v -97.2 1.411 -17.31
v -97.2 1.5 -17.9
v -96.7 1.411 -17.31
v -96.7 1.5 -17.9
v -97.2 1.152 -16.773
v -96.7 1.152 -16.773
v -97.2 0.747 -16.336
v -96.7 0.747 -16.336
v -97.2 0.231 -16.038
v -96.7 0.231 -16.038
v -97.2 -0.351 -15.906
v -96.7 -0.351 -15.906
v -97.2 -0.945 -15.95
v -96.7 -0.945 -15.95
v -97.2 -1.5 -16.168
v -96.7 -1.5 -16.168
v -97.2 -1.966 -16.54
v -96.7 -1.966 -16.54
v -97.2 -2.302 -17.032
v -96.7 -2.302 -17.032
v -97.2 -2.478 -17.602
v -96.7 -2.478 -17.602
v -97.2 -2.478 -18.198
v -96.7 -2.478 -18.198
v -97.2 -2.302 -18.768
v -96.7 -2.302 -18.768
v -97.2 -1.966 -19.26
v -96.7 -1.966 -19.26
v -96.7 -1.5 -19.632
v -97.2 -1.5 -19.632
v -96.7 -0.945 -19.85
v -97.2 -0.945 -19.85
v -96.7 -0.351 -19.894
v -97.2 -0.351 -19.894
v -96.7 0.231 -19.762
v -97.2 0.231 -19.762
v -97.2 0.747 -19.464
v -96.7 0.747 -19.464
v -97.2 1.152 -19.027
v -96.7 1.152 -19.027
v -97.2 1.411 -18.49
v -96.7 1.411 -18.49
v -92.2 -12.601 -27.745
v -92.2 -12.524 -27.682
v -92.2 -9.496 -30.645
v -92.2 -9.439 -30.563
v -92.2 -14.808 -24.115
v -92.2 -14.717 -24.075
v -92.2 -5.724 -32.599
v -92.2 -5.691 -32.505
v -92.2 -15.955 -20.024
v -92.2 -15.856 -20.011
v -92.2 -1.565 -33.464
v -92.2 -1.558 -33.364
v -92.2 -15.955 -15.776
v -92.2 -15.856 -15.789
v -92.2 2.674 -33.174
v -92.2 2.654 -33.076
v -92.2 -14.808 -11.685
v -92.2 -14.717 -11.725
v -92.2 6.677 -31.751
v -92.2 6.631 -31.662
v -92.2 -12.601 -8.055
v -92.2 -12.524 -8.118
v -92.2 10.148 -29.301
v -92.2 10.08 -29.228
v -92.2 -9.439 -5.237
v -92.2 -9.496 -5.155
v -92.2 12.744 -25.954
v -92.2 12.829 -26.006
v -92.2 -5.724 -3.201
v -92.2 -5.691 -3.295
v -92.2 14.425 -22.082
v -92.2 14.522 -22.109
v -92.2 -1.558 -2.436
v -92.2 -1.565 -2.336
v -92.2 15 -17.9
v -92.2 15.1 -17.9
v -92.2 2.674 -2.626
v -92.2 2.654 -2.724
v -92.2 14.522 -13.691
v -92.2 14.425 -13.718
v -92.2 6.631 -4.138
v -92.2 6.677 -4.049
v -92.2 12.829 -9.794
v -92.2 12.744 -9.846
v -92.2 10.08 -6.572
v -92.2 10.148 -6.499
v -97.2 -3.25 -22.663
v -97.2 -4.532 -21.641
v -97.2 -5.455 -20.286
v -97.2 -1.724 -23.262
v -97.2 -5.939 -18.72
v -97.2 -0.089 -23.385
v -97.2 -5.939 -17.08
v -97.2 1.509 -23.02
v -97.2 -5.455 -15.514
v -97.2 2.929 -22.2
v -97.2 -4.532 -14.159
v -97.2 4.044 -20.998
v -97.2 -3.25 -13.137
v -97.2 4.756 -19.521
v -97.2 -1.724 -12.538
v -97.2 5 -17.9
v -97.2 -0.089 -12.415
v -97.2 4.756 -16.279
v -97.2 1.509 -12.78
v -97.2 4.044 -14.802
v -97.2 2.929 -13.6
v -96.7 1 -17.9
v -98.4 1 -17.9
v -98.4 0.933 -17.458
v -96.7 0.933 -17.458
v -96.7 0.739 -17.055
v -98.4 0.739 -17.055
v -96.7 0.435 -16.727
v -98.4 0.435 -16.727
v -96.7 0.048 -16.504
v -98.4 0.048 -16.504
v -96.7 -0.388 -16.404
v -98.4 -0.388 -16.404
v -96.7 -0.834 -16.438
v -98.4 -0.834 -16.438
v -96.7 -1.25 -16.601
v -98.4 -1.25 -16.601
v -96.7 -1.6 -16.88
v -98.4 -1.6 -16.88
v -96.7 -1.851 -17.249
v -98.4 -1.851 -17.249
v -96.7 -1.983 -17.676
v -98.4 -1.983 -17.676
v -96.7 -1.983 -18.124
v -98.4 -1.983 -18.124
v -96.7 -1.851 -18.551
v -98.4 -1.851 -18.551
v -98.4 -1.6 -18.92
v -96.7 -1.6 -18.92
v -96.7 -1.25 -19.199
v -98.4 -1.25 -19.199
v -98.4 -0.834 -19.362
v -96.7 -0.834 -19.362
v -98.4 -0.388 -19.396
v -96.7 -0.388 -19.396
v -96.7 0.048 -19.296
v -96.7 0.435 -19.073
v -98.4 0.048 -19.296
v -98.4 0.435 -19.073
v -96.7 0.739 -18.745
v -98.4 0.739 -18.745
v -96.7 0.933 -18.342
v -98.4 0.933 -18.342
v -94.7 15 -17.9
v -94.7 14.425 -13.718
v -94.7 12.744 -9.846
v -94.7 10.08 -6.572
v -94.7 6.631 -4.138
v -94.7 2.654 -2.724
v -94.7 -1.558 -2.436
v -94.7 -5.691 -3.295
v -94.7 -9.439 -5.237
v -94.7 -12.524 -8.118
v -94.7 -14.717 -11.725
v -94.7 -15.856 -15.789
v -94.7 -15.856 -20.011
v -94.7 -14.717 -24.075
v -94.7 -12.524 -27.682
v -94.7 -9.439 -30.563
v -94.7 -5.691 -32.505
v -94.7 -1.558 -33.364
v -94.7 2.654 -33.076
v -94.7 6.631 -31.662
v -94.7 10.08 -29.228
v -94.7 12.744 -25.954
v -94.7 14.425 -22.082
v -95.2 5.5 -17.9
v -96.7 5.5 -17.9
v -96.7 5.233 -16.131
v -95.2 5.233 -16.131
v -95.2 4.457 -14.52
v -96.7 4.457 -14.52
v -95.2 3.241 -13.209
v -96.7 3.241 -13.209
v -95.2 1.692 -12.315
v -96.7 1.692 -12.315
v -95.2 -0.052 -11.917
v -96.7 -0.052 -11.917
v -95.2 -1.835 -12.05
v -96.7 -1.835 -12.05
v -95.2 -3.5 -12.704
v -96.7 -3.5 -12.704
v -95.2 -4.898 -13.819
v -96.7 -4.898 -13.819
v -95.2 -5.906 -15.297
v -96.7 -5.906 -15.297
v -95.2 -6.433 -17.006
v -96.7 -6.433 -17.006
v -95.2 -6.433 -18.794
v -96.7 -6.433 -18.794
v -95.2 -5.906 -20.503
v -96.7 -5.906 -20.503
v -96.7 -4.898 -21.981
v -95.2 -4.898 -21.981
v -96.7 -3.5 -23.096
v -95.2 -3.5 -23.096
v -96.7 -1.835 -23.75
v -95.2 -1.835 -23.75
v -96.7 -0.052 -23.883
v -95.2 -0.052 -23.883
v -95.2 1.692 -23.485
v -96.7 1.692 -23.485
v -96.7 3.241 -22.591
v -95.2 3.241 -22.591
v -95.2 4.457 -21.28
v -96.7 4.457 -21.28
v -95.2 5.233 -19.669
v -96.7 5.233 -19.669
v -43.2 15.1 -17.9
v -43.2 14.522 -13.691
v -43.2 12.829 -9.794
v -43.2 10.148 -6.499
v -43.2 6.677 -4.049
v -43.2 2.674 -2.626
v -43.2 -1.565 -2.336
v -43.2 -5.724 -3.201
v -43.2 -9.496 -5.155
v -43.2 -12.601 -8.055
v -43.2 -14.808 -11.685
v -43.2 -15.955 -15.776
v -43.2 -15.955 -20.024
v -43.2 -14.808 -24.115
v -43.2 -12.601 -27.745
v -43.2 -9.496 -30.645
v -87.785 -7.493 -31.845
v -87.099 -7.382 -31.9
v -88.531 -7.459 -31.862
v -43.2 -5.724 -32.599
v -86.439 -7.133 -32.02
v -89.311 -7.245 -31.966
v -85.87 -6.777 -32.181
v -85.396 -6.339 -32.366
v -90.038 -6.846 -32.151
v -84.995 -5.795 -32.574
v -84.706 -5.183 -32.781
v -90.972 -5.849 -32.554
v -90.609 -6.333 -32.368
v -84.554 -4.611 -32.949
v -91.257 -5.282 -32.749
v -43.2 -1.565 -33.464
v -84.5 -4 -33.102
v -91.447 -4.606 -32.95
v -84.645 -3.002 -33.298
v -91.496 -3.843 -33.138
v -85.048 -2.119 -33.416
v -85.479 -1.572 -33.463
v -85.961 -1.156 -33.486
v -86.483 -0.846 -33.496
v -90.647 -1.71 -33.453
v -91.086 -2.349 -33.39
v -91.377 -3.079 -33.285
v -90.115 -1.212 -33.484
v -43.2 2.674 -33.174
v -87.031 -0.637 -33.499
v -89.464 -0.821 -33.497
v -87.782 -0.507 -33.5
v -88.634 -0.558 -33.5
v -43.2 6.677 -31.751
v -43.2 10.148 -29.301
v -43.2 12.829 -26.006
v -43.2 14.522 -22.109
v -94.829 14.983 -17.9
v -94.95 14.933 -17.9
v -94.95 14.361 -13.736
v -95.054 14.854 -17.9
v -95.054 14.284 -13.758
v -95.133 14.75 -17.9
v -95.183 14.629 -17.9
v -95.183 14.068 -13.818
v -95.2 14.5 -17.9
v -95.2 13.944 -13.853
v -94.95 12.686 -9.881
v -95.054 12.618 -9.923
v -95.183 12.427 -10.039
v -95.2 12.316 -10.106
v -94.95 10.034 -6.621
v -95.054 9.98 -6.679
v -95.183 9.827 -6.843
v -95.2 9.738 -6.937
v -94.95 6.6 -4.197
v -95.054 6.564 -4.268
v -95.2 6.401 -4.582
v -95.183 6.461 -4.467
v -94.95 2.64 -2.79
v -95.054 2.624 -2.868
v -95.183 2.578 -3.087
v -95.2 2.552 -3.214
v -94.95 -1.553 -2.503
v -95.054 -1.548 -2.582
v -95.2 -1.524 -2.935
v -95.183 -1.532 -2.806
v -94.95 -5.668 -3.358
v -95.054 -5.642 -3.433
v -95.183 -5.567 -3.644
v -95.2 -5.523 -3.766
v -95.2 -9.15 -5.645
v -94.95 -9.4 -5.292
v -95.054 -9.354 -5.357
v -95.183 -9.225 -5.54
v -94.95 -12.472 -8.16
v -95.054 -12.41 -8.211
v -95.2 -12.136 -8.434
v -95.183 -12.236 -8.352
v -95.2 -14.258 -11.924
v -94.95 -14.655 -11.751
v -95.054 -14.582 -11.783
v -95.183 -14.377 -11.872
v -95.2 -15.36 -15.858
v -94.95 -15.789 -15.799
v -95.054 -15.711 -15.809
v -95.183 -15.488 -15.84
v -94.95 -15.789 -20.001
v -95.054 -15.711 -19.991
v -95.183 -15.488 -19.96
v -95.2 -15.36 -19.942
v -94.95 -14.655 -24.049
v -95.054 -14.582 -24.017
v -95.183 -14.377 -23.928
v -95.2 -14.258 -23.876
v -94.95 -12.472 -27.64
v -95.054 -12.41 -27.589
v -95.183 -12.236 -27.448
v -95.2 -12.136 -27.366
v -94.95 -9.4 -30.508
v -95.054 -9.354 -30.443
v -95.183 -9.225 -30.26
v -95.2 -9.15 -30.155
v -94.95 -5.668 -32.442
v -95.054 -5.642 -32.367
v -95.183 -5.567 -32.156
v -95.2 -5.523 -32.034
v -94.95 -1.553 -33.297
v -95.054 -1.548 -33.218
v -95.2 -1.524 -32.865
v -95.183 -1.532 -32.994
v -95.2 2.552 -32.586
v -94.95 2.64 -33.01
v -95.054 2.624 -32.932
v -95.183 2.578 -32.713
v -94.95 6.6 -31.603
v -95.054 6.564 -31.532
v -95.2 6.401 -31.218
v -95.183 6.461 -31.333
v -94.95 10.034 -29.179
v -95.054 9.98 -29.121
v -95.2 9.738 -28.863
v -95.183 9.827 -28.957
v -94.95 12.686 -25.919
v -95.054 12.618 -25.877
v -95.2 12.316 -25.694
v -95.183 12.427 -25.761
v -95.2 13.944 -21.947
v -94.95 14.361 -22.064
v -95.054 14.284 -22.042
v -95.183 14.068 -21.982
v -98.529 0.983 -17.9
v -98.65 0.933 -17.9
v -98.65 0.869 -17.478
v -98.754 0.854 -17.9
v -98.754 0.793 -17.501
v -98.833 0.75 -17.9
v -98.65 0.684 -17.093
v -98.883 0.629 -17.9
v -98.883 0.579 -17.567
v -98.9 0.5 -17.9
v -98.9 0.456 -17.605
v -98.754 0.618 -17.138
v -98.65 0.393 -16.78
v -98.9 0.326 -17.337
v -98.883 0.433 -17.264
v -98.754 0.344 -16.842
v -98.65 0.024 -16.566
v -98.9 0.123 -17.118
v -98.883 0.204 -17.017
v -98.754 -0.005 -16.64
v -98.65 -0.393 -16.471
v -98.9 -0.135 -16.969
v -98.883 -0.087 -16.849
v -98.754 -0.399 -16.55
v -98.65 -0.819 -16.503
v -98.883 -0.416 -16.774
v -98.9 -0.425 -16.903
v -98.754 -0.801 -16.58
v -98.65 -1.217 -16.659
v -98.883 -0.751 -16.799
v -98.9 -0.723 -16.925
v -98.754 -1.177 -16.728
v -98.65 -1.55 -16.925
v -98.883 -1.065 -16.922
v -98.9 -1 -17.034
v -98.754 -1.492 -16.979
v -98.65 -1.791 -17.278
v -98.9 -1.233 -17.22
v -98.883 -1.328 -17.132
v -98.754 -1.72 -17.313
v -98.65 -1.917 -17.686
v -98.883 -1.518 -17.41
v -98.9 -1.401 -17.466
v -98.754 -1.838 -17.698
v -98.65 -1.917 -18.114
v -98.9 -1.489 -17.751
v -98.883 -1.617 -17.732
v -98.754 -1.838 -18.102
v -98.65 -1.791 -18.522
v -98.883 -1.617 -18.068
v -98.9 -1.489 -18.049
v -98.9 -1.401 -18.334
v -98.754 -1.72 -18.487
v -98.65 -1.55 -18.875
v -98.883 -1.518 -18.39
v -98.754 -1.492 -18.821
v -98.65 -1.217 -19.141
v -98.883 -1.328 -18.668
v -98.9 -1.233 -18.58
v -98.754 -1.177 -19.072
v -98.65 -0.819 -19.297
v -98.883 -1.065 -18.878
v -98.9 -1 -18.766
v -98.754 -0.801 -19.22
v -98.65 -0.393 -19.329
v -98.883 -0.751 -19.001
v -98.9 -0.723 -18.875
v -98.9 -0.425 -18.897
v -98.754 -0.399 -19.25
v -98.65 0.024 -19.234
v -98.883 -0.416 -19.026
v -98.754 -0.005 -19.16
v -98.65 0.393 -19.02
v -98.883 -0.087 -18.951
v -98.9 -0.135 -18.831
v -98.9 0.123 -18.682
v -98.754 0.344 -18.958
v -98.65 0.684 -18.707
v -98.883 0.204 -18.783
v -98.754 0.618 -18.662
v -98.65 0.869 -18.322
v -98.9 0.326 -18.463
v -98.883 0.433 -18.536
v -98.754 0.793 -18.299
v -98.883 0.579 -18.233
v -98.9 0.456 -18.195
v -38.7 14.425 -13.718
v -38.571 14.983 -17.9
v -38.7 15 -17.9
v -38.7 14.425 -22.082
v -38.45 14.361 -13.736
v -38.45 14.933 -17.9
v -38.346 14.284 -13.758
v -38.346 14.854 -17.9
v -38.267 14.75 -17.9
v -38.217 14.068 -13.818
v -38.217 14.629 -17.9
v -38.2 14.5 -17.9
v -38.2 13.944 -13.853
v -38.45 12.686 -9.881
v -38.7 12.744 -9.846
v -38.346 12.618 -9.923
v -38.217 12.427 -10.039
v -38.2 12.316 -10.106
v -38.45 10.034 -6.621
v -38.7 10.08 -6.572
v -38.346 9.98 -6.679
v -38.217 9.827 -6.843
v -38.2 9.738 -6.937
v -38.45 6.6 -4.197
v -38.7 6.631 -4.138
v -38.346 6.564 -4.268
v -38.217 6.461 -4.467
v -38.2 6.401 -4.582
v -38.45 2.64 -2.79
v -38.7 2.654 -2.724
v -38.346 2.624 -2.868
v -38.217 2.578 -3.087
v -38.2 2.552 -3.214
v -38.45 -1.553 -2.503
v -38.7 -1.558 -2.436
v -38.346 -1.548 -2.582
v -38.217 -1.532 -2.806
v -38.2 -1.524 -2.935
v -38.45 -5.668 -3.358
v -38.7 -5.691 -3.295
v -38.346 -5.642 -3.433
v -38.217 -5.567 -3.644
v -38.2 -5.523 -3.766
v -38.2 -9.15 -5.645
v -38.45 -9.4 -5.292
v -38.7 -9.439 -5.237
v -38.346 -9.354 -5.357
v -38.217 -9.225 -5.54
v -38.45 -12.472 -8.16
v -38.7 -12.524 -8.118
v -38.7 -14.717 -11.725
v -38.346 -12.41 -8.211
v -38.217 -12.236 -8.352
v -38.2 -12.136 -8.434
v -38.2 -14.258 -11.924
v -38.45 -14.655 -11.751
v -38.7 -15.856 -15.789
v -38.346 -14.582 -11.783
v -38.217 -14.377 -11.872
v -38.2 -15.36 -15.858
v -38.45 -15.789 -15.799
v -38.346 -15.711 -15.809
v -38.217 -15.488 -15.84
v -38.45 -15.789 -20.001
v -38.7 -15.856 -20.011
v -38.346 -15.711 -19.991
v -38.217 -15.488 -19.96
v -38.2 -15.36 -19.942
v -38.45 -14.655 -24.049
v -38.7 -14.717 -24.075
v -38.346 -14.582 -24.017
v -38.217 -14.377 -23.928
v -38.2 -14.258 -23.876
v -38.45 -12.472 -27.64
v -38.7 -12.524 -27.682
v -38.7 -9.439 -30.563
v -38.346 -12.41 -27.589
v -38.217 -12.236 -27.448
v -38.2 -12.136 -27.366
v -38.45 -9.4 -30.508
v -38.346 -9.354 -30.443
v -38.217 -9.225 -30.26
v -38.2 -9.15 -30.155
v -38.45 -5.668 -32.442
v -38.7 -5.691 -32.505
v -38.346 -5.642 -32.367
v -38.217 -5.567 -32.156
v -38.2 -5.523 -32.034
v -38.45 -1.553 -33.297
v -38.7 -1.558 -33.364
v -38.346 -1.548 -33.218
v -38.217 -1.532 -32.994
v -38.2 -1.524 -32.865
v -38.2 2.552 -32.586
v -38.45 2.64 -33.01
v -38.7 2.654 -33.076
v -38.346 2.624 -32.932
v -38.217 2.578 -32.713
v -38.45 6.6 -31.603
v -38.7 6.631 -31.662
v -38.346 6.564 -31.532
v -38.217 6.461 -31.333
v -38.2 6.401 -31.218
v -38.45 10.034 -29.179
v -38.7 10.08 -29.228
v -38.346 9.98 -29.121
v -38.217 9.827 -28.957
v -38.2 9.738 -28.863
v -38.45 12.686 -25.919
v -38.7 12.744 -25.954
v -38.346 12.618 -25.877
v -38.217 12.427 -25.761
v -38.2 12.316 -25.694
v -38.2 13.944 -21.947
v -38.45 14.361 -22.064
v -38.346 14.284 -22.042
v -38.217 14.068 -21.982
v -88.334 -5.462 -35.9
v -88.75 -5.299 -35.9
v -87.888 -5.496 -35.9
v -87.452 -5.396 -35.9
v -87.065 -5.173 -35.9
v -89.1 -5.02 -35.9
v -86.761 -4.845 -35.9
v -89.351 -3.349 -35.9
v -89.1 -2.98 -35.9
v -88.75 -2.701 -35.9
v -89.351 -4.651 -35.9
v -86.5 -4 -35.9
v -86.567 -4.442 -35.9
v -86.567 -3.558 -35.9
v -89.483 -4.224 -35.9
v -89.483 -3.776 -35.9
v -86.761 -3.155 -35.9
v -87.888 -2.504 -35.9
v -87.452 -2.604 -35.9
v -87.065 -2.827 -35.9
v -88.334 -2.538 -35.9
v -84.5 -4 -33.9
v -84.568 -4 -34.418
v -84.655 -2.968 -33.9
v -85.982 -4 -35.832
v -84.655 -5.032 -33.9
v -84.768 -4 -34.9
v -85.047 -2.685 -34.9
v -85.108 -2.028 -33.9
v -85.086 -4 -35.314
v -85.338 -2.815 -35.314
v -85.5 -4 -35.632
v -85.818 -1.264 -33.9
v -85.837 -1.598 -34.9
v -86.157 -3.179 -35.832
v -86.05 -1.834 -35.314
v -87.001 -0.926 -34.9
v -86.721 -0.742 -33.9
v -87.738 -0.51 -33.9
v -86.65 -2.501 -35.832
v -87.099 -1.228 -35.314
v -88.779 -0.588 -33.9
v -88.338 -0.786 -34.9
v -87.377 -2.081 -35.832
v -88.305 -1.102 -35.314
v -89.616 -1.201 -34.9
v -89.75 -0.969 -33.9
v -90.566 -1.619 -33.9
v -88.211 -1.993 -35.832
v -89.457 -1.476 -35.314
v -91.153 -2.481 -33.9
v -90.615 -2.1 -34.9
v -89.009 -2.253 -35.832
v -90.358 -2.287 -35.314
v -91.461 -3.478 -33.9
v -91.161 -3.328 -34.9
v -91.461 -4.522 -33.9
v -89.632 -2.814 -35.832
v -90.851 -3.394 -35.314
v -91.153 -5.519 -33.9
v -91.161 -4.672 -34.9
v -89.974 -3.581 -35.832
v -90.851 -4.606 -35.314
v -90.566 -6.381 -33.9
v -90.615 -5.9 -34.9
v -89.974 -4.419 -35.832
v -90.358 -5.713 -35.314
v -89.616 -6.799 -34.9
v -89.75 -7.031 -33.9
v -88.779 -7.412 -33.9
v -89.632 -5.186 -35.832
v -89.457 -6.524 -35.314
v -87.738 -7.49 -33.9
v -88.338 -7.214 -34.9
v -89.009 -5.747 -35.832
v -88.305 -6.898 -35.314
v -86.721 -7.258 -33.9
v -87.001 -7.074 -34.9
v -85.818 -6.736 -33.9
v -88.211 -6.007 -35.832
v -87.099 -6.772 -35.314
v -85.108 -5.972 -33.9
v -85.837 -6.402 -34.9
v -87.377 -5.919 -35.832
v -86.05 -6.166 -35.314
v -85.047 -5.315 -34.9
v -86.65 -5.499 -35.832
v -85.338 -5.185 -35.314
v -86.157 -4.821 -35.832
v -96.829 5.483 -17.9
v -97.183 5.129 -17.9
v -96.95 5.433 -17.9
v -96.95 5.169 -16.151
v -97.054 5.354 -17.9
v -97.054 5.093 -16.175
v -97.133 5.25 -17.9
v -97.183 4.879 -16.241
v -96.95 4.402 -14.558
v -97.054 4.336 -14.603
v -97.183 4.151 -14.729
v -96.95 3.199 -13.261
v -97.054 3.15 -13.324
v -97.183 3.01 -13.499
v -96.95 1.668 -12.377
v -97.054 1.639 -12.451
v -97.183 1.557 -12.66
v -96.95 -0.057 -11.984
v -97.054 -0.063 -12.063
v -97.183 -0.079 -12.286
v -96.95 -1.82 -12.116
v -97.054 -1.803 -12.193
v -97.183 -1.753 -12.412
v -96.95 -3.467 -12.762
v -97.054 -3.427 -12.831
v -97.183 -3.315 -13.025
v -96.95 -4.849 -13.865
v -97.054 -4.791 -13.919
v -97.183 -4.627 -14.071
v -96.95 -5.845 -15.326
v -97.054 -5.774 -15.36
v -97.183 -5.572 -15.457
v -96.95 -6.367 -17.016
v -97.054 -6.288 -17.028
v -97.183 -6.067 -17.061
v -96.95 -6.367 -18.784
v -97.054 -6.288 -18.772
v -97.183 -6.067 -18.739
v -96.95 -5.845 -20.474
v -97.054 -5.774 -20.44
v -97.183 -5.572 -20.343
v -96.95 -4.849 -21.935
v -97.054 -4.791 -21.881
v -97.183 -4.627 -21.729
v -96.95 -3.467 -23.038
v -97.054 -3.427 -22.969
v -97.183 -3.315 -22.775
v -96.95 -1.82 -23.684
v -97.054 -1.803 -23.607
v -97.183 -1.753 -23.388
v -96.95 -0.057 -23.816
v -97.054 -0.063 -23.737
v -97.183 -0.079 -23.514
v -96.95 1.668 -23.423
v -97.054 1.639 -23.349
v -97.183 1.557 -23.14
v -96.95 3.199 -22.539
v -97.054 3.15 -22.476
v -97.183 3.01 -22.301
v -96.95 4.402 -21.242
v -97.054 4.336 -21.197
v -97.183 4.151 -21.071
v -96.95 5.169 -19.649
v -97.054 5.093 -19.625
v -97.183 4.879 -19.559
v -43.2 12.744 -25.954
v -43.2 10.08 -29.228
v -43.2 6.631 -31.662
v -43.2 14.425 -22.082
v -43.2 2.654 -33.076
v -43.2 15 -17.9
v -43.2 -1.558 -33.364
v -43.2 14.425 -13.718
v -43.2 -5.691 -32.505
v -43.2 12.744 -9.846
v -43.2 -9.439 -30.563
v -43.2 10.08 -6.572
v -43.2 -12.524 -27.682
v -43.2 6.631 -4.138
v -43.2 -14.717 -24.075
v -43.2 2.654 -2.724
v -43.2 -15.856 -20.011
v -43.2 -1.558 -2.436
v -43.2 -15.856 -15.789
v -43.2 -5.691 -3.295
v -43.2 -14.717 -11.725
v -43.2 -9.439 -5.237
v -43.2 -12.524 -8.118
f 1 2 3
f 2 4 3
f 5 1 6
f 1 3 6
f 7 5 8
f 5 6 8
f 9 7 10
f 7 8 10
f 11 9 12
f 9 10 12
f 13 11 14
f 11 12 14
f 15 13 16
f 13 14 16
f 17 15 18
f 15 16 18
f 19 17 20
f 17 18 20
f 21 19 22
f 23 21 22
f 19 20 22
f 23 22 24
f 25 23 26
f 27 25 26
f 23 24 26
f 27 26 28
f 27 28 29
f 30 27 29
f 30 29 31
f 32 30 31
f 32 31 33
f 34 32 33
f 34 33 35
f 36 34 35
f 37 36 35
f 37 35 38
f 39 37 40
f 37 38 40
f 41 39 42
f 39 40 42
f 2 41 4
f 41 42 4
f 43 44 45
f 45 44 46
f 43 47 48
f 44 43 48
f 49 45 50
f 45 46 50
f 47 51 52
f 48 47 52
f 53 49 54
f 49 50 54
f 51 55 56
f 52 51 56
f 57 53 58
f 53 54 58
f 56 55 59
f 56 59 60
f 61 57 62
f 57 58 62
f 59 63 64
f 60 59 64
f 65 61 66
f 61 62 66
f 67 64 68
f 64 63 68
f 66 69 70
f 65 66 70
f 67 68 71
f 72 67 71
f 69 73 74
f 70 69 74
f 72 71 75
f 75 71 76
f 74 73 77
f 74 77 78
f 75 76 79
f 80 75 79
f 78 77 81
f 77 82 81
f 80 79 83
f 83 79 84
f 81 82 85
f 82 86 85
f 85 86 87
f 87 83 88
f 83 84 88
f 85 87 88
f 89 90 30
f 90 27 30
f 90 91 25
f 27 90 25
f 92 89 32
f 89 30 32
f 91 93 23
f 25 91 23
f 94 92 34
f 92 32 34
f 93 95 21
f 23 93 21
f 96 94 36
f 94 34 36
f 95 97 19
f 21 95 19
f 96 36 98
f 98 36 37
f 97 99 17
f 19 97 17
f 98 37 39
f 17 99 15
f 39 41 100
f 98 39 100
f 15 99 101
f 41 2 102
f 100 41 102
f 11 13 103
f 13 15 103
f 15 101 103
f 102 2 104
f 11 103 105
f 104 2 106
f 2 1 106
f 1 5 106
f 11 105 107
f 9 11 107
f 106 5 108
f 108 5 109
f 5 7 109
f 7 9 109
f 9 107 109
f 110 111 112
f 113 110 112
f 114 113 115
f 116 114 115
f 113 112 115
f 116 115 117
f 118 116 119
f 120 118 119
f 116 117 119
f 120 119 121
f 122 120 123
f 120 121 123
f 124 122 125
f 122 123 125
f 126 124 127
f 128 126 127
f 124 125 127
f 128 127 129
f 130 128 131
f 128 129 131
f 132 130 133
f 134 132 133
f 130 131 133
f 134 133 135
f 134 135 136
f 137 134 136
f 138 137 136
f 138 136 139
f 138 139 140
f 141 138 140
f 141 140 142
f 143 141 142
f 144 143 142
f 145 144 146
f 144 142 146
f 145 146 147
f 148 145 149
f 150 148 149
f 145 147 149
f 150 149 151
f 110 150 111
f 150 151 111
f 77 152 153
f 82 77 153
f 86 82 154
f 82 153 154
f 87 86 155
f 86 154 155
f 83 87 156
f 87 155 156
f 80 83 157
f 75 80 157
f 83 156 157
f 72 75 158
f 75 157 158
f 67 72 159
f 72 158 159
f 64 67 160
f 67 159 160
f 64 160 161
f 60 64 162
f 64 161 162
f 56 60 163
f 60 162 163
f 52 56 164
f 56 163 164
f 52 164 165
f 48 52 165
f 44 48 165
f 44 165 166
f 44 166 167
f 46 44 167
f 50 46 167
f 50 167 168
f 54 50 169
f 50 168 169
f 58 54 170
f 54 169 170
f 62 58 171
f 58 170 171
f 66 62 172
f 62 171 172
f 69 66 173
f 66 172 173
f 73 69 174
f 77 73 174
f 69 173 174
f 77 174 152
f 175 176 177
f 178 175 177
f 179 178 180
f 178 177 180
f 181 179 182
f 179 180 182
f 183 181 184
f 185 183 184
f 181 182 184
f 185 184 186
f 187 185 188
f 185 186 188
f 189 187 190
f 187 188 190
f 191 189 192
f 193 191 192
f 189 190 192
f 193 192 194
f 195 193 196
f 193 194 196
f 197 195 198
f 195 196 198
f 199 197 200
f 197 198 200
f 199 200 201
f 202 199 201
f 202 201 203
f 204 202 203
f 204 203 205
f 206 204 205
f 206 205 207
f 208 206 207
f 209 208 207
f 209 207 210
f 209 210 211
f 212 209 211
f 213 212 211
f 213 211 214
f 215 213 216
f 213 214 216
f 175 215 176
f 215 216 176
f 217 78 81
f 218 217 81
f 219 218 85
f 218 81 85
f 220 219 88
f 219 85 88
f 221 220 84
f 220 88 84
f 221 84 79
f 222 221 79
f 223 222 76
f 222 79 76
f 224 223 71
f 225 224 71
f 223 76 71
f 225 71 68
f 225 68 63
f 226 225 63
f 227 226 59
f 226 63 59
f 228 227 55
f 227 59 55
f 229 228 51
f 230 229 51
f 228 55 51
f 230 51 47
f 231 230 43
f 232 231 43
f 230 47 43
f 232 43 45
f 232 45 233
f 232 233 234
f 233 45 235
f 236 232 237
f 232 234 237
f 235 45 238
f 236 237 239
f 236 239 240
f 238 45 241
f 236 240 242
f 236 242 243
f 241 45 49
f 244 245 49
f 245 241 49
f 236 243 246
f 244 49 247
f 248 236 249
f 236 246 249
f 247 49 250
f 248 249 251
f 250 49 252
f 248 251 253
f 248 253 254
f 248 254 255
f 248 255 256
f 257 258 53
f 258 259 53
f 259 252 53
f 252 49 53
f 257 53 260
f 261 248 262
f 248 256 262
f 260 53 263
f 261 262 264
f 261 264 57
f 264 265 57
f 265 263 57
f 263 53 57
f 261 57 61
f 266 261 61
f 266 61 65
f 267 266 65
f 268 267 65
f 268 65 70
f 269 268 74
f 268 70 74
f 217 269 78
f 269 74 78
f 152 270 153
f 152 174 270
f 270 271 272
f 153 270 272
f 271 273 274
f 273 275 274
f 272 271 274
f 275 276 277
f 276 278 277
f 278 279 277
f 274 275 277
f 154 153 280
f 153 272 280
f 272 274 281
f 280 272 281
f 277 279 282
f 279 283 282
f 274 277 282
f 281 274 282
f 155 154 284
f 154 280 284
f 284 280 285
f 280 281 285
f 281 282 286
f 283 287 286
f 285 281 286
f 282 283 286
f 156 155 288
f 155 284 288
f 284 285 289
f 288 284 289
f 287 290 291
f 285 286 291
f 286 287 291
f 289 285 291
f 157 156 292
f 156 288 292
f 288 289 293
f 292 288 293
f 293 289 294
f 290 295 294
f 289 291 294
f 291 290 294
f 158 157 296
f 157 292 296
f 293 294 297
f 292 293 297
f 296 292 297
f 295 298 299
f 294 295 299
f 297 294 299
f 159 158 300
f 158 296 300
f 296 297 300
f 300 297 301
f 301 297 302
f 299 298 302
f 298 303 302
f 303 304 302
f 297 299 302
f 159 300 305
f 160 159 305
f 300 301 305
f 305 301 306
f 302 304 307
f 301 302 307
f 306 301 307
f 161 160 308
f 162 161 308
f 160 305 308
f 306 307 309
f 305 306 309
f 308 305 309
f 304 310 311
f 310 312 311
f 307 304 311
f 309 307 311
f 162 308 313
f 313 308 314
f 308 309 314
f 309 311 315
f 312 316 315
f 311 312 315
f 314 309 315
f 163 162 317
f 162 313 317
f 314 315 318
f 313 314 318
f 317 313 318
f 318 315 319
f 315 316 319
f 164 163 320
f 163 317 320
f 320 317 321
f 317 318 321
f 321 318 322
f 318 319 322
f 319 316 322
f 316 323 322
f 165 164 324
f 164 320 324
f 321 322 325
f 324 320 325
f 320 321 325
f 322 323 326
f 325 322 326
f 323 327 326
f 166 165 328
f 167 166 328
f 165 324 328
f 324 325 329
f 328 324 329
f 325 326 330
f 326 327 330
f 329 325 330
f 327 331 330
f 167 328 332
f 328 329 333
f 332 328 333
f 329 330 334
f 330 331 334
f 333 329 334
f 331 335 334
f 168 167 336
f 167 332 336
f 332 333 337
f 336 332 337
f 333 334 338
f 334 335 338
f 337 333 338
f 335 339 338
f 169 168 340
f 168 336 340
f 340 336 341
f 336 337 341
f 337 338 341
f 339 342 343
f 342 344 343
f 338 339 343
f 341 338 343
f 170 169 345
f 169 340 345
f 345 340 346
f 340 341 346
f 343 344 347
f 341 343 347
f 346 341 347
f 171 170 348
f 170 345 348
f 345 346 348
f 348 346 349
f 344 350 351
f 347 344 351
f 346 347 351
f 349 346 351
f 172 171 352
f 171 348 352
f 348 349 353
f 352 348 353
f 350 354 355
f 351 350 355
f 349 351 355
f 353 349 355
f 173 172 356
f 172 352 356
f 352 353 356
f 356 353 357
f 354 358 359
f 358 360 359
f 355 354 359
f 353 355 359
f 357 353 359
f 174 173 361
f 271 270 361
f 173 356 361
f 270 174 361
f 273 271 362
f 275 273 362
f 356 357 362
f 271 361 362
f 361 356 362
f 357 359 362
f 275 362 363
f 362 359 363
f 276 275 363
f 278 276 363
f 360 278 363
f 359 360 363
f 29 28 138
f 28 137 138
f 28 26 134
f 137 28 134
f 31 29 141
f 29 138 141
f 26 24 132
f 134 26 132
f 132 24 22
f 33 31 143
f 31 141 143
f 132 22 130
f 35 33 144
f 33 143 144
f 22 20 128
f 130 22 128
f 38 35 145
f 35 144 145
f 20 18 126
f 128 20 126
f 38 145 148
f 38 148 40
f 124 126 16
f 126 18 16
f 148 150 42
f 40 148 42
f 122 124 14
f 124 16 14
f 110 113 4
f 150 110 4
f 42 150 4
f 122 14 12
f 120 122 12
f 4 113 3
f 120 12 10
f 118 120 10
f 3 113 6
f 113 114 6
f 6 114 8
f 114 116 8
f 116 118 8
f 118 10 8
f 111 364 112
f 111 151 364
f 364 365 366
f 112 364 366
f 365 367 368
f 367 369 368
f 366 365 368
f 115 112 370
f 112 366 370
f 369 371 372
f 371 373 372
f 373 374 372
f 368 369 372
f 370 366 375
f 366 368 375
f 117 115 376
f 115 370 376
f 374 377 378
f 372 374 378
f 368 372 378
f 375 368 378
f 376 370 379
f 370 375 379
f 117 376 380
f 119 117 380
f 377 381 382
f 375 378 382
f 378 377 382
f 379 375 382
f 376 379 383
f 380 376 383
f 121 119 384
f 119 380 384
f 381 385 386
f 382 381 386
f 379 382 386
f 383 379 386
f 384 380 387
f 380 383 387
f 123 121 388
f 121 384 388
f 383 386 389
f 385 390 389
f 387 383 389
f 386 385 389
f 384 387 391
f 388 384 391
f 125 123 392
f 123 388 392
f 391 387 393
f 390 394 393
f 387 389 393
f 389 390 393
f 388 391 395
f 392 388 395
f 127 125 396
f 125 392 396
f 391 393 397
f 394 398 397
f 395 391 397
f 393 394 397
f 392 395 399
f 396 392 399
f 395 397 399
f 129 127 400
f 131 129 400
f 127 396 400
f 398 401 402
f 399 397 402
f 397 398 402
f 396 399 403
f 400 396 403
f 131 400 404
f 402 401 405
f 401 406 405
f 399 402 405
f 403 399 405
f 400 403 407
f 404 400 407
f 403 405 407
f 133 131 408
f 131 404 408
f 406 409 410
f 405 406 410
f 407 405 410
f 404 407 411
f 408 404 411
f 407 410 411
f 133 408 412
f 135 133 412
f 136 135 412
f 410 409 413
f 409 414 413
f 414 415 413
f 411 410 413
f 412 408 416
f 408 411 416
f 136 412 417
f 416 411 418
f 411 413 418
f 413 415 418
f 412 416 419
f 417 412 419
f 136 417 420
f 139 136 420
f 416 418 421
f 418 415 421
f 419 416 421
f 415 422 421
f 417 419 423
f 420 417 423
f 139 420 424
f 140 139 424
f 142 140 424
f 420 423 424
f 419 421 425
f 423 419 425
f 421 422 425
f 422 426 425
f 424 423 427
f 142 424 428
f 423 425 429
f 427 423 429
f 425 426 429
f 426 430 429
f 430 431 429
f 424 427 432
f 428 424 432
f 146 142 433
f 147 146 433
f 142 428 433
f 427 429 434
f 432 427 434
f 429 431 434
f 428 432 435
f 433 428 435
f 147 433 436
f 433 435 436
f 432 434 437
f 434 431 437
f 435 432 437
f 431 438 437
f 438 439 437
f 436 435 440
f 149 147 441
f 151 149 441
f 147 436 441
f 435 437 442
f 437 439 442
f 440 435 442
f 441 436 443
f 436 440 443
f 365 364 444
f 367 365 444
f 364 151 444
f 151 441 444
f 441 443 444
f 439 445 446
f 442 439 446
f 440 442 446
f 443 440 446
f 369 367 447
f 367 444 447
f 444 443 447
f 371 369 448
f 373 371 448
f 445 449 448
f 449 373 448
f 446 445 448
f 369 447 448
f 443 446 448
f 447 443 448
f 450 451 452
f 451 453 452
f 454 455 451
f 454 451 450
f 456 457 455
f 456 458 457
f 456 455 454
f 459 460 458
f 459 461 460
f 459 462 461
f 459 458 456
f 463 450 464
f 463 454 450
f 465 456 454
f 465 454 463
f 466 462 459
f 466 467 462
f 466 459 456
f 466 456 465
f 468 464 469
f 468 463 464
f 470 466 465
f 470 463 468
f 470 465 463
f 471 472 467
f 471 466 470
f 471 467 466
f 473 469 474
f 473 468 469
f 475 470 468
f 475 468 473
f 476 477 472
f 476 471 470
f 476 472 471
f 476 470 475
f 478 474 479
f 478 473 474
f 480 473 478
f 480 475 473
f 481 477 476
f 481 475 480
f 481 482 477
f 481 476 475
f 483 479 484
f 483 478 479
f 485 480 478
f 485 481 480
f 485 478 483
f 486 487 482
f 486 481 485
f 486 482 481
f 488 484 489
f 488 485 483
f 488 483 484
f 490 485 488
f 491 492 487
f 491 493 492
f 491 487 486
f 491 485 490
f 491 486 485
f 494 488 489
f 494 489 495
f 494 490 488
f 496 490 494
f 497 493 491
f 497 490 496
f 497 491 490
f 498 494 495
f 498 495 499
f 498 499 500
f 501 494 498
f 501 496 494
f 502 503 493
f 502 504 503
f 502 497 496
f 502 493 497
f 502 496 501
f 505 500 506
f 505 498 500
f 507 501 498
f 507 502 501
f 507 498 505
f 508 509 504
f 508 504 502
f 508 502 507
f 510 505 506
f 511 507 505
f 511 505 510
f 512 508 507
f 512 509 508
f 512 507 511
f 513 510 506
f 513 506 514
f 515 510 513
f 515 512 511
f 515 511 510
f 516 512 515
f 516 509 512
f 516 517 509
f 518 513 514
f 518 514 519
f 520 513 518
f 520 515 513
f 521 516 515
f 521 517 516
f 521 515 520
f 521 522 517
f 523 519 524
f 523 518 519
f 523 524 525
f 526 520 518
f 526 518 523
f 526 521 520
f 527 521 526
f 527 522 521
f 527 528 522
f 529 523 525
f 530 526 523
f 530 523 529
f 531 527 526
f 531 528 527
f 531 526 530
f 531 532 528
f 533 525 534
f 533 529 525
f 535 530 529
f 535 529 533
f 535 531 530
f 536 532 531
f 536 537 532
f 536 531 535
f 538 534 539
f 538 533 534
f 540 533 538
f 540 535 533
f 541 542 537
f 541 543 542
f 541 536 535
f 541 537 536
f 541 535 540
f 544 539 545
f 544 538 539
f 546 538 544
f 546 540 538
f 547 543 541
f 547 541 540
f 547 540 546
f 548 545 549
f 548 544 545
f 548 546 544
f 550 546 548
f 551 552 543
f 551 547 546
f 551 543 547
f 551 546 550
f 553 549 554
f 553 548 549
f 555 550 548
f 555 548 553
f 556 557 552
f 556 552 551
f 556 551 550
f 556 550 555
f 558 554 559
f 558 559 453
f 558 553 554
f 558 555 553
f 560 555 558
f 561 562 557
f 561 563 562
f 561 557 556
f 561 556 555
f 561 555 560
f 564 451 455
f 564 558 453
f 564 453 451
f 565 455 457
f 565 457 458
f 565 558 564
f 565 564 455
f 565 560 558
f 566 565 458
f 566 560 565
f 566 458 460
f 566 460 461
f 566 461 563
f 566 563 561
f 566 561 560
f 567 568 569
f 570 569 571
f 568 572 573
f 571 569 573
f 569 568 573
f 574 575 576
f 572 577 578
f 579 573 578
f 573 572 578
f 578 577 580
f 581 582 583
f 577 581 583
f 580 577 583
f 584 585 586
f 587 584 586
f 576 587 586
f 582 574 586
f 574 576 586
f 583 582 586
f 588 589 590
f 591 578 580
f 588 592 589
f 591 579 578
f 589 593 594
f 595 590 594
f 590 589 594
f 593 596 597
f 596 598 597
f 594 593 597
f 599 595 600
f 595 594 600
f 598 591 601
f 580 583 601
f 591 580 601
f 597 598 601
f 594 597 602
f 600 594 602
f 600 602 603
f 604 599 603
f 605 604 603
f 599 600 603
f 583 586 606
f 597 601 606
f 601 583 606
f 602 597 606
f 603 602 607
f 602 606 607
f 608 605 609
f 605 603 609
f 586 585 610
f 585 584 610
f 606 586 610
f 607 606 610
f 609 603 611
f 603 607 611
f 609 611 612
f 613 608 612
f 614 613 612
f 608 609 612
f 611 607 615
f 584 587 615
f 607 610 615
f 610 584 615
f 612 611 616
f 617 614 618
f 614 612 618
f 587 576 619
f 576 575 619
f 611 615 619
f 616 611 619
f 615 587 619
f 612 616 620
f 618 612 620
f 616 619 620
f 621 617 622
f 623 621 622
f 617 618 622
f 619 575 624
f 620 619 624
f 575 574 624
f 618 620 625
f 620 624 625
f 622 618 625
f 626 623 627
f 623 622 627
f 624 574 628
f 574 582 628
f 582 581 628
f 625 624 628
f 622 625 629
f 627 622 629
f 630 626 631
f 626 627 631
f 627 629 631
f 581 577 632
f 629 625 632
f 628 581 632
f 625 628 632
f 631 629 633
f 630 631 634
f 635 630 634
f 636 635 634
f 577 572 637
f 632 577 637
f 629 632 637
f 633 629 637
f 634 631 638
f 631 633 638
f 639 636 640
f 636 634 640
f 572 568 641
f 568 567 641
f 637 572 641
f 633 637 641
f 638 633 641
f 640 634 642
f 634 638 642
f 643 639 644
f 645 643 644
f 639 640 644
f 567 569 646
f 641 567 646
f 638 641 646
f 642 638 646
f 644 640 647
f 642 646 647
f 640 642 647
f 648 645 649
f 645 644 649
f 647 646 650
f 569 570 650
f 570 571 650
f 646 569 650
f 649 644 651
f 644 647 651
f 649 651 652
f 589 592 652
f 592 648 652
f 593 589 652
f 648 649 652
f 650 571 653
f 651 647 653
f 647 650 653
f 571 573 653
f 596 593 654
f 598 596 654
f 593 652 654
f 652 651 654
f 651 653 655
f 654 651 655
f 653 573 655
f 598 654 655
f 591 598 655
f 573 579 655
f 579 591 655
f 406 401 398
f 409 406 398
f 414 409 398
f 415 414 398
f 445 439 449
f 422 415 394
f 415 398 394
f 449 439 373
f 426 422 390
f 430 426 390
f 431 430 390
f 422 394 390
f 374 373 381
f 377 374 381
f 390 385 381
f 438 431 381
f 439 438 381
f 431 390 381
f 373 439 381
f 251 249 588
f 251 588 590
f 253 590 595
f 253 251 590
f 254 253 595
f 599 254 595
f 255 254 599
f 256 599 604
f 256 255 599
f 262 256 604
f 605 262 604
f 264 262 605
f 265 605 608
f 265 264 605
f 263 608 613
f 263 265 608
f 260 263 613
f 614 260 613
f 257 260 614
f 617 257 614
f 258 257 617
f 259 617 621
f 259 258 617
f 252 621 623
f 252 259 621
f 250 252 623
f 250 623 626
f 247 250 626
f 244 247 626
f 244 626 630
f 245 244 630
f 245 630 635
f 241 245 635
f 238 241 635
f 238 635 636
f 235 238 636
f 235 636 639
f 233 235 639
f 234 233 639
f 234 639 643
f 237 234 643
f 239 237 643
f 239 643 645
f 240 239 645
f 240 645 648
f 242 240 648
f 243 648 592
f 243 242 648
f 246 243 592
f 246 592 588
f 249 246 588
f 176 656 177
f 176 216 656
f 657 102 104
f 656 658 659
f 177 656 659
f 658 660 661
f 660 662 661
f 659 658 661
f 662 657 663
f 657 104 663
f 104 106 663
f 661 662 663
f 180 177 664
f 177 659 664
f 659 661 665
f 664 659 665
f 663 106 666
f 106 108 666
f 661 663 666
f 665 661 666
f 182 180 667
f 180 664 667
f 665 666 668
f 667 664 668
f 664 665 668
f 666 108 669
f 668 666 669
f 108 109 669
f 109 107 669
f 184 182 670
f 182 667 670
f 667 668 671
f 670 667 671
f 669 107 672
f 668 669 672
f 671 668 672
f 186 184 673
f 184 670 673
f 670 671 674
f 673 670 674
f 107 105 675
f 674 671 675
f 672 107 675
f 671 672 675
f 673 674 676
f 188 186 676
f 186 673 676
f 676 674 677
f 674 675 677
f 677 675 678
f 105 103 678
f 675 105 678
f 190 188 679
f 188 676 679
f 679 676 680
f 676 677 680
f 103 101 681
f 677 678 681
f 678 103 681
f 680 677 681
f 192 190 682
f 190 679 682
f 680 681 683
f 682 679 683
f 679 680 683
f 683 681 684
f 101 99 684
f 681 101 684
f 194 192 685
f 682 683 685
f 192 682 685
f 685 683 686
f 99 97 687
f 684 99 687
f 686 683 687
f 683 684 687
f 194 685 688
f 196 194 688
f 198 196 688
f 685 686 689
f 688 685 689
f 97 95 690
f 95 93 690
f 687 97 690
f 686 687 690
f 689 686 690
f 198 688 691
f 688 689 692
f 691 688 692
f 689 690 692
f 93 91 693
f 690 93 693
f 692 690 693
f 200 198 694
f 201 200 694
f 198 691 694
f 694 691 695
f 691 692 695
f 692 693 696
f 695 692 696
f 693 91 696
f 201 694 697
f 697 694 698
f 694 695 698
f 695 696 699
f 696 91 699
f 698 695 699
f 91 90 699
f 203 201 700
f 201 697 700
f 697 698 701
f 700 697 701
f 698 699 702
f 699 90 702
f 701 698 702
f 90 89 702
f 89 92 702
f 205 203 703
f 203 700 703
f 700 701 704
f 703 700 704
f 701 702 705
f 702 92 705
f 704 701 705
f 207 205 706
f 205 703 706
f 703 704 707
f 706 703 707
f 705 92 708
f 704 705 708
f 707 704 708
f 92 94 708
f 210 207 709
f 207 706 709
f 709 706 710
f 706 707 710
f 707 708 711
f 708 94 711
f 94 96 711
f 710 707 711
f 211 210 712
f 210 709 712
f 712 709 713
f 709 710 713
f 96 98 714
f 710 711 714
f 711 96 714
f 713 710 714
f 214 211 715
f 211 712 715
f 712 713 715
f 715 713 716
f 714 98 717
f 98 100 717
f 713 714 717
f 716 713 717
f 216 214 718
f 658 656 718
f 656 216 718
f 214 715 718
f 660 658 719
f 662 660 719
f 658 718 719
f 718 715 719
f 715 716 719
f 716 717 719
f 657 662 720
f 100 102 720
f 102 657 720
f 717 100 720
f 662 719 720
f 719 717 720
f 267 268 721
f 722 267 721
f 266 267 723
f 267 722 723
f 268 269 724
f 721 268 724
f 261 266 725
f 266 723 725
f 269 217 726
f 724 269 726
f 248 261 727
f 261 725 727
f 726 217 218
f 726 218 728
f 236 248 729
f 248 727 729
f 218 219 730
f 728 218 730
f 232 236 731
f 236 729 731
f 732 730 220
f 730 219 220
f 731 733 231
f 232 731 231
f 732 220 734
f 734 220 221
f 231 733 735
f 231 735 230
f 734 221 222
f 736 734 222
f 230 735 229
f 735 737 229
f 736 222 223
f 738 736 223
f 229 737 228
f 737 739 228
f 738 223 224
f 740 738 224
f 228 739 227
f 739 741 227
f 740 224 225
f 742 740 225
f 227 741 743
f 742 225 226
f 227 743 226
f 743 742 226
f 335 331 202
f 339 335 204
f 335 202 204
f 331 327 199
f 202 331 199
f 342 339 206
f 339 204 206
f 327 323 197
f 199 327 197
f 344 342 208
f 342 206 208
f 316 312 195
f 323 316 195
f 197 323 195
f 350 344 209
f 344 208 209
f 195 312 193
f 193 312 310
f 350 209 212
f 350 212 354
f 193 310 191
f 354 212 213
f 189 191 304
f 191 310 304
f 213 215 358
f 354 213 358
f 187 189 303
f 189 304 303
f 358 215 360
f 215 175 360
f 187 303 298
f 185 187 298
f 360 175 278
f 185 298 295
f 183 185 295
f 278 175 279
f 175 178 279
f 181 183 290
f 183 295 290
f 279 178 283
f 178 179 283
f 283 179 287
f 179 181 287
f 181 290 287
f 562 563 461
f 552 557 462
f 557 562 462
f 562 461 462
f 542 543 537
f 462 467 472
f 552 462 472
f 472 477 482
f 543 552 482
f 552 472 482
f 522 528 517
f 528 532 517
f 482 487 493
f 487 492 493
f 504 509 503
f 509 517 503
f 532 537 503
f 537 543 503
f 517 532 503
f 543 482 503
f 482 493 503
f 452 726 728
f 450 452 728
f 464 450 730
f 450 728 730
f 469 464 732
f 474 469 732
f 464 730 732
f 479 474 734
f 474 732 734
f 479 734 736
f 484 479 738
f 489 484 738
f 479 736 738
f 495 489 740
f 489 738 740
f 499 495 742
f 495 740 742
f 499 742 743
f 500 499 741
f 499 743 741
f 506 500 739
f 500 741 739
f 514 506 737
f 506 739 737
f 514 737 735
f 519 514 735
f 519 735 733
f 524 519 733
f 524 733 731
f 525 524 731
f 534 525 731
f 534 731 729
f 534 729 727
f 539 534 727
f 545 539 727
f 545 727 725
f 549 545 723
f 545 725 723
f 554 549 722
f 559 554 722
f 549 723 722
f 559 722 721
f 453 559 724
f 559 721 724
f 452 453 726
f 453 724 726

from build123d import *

# Parameters (mm, degrees)
SKETCH007_R  = 3.5
PAD004_DEPTH = 18
FILLET_R     = 2
FILLET001_R  = 0.5


with BuildPart() as part:
    # Sketch006 → Revolution (revolve)
    with BuildSketch(Plane.XY):
        Polygon((-38.2, 0), (-38.2, 15.5), (-43.2, 15.5), (-43.2, 15.6), (-92.2, 15.6), (-92.2, 15.5), (-95.2, 15.5), (-95.2, 6), (-97.2, 6), (-97.2, 2), (-96.7, 2), (-96.7, 1.5), (-98.9, 1.5), (-98.9, 0), align=None)
    revolve(axis=Axis((0, 0, 0), (1, 0, 0)))

    # Sketch007 → Pad004 (new body)
    with BuildSketch(Plane.XY):
        with Locations((-88, -3.5)):
            Circle(SKETCH007_R)
    extrude(amount=-PAD004_DEPTH)

    # Fillet
    fillet_edges = [part.edges().sort_by_distance(p)[0] for p in [
        (-91.5, -3.5, -18),
    ]]
    fillet(fillet_edges, radius=FILLET_R)

    # Fillet001
    fillet001_edges = [part.edges().sort_by_distance(p)[0] for p in [
        (-95.2, -15.5, 0),
        (-38.2, -15.5, 0),
        (-97.2, -6, 0),
        (-98.9, -1.5, 0),
    ]]
    fillet(fillet001_edges, radius=FILLET001_R)


with BuildPart() as part_1:
    # Body001 placement: moved
    add(part.part.moved(Location((0, -0.5, -17.9))))


solid = part_1.part
